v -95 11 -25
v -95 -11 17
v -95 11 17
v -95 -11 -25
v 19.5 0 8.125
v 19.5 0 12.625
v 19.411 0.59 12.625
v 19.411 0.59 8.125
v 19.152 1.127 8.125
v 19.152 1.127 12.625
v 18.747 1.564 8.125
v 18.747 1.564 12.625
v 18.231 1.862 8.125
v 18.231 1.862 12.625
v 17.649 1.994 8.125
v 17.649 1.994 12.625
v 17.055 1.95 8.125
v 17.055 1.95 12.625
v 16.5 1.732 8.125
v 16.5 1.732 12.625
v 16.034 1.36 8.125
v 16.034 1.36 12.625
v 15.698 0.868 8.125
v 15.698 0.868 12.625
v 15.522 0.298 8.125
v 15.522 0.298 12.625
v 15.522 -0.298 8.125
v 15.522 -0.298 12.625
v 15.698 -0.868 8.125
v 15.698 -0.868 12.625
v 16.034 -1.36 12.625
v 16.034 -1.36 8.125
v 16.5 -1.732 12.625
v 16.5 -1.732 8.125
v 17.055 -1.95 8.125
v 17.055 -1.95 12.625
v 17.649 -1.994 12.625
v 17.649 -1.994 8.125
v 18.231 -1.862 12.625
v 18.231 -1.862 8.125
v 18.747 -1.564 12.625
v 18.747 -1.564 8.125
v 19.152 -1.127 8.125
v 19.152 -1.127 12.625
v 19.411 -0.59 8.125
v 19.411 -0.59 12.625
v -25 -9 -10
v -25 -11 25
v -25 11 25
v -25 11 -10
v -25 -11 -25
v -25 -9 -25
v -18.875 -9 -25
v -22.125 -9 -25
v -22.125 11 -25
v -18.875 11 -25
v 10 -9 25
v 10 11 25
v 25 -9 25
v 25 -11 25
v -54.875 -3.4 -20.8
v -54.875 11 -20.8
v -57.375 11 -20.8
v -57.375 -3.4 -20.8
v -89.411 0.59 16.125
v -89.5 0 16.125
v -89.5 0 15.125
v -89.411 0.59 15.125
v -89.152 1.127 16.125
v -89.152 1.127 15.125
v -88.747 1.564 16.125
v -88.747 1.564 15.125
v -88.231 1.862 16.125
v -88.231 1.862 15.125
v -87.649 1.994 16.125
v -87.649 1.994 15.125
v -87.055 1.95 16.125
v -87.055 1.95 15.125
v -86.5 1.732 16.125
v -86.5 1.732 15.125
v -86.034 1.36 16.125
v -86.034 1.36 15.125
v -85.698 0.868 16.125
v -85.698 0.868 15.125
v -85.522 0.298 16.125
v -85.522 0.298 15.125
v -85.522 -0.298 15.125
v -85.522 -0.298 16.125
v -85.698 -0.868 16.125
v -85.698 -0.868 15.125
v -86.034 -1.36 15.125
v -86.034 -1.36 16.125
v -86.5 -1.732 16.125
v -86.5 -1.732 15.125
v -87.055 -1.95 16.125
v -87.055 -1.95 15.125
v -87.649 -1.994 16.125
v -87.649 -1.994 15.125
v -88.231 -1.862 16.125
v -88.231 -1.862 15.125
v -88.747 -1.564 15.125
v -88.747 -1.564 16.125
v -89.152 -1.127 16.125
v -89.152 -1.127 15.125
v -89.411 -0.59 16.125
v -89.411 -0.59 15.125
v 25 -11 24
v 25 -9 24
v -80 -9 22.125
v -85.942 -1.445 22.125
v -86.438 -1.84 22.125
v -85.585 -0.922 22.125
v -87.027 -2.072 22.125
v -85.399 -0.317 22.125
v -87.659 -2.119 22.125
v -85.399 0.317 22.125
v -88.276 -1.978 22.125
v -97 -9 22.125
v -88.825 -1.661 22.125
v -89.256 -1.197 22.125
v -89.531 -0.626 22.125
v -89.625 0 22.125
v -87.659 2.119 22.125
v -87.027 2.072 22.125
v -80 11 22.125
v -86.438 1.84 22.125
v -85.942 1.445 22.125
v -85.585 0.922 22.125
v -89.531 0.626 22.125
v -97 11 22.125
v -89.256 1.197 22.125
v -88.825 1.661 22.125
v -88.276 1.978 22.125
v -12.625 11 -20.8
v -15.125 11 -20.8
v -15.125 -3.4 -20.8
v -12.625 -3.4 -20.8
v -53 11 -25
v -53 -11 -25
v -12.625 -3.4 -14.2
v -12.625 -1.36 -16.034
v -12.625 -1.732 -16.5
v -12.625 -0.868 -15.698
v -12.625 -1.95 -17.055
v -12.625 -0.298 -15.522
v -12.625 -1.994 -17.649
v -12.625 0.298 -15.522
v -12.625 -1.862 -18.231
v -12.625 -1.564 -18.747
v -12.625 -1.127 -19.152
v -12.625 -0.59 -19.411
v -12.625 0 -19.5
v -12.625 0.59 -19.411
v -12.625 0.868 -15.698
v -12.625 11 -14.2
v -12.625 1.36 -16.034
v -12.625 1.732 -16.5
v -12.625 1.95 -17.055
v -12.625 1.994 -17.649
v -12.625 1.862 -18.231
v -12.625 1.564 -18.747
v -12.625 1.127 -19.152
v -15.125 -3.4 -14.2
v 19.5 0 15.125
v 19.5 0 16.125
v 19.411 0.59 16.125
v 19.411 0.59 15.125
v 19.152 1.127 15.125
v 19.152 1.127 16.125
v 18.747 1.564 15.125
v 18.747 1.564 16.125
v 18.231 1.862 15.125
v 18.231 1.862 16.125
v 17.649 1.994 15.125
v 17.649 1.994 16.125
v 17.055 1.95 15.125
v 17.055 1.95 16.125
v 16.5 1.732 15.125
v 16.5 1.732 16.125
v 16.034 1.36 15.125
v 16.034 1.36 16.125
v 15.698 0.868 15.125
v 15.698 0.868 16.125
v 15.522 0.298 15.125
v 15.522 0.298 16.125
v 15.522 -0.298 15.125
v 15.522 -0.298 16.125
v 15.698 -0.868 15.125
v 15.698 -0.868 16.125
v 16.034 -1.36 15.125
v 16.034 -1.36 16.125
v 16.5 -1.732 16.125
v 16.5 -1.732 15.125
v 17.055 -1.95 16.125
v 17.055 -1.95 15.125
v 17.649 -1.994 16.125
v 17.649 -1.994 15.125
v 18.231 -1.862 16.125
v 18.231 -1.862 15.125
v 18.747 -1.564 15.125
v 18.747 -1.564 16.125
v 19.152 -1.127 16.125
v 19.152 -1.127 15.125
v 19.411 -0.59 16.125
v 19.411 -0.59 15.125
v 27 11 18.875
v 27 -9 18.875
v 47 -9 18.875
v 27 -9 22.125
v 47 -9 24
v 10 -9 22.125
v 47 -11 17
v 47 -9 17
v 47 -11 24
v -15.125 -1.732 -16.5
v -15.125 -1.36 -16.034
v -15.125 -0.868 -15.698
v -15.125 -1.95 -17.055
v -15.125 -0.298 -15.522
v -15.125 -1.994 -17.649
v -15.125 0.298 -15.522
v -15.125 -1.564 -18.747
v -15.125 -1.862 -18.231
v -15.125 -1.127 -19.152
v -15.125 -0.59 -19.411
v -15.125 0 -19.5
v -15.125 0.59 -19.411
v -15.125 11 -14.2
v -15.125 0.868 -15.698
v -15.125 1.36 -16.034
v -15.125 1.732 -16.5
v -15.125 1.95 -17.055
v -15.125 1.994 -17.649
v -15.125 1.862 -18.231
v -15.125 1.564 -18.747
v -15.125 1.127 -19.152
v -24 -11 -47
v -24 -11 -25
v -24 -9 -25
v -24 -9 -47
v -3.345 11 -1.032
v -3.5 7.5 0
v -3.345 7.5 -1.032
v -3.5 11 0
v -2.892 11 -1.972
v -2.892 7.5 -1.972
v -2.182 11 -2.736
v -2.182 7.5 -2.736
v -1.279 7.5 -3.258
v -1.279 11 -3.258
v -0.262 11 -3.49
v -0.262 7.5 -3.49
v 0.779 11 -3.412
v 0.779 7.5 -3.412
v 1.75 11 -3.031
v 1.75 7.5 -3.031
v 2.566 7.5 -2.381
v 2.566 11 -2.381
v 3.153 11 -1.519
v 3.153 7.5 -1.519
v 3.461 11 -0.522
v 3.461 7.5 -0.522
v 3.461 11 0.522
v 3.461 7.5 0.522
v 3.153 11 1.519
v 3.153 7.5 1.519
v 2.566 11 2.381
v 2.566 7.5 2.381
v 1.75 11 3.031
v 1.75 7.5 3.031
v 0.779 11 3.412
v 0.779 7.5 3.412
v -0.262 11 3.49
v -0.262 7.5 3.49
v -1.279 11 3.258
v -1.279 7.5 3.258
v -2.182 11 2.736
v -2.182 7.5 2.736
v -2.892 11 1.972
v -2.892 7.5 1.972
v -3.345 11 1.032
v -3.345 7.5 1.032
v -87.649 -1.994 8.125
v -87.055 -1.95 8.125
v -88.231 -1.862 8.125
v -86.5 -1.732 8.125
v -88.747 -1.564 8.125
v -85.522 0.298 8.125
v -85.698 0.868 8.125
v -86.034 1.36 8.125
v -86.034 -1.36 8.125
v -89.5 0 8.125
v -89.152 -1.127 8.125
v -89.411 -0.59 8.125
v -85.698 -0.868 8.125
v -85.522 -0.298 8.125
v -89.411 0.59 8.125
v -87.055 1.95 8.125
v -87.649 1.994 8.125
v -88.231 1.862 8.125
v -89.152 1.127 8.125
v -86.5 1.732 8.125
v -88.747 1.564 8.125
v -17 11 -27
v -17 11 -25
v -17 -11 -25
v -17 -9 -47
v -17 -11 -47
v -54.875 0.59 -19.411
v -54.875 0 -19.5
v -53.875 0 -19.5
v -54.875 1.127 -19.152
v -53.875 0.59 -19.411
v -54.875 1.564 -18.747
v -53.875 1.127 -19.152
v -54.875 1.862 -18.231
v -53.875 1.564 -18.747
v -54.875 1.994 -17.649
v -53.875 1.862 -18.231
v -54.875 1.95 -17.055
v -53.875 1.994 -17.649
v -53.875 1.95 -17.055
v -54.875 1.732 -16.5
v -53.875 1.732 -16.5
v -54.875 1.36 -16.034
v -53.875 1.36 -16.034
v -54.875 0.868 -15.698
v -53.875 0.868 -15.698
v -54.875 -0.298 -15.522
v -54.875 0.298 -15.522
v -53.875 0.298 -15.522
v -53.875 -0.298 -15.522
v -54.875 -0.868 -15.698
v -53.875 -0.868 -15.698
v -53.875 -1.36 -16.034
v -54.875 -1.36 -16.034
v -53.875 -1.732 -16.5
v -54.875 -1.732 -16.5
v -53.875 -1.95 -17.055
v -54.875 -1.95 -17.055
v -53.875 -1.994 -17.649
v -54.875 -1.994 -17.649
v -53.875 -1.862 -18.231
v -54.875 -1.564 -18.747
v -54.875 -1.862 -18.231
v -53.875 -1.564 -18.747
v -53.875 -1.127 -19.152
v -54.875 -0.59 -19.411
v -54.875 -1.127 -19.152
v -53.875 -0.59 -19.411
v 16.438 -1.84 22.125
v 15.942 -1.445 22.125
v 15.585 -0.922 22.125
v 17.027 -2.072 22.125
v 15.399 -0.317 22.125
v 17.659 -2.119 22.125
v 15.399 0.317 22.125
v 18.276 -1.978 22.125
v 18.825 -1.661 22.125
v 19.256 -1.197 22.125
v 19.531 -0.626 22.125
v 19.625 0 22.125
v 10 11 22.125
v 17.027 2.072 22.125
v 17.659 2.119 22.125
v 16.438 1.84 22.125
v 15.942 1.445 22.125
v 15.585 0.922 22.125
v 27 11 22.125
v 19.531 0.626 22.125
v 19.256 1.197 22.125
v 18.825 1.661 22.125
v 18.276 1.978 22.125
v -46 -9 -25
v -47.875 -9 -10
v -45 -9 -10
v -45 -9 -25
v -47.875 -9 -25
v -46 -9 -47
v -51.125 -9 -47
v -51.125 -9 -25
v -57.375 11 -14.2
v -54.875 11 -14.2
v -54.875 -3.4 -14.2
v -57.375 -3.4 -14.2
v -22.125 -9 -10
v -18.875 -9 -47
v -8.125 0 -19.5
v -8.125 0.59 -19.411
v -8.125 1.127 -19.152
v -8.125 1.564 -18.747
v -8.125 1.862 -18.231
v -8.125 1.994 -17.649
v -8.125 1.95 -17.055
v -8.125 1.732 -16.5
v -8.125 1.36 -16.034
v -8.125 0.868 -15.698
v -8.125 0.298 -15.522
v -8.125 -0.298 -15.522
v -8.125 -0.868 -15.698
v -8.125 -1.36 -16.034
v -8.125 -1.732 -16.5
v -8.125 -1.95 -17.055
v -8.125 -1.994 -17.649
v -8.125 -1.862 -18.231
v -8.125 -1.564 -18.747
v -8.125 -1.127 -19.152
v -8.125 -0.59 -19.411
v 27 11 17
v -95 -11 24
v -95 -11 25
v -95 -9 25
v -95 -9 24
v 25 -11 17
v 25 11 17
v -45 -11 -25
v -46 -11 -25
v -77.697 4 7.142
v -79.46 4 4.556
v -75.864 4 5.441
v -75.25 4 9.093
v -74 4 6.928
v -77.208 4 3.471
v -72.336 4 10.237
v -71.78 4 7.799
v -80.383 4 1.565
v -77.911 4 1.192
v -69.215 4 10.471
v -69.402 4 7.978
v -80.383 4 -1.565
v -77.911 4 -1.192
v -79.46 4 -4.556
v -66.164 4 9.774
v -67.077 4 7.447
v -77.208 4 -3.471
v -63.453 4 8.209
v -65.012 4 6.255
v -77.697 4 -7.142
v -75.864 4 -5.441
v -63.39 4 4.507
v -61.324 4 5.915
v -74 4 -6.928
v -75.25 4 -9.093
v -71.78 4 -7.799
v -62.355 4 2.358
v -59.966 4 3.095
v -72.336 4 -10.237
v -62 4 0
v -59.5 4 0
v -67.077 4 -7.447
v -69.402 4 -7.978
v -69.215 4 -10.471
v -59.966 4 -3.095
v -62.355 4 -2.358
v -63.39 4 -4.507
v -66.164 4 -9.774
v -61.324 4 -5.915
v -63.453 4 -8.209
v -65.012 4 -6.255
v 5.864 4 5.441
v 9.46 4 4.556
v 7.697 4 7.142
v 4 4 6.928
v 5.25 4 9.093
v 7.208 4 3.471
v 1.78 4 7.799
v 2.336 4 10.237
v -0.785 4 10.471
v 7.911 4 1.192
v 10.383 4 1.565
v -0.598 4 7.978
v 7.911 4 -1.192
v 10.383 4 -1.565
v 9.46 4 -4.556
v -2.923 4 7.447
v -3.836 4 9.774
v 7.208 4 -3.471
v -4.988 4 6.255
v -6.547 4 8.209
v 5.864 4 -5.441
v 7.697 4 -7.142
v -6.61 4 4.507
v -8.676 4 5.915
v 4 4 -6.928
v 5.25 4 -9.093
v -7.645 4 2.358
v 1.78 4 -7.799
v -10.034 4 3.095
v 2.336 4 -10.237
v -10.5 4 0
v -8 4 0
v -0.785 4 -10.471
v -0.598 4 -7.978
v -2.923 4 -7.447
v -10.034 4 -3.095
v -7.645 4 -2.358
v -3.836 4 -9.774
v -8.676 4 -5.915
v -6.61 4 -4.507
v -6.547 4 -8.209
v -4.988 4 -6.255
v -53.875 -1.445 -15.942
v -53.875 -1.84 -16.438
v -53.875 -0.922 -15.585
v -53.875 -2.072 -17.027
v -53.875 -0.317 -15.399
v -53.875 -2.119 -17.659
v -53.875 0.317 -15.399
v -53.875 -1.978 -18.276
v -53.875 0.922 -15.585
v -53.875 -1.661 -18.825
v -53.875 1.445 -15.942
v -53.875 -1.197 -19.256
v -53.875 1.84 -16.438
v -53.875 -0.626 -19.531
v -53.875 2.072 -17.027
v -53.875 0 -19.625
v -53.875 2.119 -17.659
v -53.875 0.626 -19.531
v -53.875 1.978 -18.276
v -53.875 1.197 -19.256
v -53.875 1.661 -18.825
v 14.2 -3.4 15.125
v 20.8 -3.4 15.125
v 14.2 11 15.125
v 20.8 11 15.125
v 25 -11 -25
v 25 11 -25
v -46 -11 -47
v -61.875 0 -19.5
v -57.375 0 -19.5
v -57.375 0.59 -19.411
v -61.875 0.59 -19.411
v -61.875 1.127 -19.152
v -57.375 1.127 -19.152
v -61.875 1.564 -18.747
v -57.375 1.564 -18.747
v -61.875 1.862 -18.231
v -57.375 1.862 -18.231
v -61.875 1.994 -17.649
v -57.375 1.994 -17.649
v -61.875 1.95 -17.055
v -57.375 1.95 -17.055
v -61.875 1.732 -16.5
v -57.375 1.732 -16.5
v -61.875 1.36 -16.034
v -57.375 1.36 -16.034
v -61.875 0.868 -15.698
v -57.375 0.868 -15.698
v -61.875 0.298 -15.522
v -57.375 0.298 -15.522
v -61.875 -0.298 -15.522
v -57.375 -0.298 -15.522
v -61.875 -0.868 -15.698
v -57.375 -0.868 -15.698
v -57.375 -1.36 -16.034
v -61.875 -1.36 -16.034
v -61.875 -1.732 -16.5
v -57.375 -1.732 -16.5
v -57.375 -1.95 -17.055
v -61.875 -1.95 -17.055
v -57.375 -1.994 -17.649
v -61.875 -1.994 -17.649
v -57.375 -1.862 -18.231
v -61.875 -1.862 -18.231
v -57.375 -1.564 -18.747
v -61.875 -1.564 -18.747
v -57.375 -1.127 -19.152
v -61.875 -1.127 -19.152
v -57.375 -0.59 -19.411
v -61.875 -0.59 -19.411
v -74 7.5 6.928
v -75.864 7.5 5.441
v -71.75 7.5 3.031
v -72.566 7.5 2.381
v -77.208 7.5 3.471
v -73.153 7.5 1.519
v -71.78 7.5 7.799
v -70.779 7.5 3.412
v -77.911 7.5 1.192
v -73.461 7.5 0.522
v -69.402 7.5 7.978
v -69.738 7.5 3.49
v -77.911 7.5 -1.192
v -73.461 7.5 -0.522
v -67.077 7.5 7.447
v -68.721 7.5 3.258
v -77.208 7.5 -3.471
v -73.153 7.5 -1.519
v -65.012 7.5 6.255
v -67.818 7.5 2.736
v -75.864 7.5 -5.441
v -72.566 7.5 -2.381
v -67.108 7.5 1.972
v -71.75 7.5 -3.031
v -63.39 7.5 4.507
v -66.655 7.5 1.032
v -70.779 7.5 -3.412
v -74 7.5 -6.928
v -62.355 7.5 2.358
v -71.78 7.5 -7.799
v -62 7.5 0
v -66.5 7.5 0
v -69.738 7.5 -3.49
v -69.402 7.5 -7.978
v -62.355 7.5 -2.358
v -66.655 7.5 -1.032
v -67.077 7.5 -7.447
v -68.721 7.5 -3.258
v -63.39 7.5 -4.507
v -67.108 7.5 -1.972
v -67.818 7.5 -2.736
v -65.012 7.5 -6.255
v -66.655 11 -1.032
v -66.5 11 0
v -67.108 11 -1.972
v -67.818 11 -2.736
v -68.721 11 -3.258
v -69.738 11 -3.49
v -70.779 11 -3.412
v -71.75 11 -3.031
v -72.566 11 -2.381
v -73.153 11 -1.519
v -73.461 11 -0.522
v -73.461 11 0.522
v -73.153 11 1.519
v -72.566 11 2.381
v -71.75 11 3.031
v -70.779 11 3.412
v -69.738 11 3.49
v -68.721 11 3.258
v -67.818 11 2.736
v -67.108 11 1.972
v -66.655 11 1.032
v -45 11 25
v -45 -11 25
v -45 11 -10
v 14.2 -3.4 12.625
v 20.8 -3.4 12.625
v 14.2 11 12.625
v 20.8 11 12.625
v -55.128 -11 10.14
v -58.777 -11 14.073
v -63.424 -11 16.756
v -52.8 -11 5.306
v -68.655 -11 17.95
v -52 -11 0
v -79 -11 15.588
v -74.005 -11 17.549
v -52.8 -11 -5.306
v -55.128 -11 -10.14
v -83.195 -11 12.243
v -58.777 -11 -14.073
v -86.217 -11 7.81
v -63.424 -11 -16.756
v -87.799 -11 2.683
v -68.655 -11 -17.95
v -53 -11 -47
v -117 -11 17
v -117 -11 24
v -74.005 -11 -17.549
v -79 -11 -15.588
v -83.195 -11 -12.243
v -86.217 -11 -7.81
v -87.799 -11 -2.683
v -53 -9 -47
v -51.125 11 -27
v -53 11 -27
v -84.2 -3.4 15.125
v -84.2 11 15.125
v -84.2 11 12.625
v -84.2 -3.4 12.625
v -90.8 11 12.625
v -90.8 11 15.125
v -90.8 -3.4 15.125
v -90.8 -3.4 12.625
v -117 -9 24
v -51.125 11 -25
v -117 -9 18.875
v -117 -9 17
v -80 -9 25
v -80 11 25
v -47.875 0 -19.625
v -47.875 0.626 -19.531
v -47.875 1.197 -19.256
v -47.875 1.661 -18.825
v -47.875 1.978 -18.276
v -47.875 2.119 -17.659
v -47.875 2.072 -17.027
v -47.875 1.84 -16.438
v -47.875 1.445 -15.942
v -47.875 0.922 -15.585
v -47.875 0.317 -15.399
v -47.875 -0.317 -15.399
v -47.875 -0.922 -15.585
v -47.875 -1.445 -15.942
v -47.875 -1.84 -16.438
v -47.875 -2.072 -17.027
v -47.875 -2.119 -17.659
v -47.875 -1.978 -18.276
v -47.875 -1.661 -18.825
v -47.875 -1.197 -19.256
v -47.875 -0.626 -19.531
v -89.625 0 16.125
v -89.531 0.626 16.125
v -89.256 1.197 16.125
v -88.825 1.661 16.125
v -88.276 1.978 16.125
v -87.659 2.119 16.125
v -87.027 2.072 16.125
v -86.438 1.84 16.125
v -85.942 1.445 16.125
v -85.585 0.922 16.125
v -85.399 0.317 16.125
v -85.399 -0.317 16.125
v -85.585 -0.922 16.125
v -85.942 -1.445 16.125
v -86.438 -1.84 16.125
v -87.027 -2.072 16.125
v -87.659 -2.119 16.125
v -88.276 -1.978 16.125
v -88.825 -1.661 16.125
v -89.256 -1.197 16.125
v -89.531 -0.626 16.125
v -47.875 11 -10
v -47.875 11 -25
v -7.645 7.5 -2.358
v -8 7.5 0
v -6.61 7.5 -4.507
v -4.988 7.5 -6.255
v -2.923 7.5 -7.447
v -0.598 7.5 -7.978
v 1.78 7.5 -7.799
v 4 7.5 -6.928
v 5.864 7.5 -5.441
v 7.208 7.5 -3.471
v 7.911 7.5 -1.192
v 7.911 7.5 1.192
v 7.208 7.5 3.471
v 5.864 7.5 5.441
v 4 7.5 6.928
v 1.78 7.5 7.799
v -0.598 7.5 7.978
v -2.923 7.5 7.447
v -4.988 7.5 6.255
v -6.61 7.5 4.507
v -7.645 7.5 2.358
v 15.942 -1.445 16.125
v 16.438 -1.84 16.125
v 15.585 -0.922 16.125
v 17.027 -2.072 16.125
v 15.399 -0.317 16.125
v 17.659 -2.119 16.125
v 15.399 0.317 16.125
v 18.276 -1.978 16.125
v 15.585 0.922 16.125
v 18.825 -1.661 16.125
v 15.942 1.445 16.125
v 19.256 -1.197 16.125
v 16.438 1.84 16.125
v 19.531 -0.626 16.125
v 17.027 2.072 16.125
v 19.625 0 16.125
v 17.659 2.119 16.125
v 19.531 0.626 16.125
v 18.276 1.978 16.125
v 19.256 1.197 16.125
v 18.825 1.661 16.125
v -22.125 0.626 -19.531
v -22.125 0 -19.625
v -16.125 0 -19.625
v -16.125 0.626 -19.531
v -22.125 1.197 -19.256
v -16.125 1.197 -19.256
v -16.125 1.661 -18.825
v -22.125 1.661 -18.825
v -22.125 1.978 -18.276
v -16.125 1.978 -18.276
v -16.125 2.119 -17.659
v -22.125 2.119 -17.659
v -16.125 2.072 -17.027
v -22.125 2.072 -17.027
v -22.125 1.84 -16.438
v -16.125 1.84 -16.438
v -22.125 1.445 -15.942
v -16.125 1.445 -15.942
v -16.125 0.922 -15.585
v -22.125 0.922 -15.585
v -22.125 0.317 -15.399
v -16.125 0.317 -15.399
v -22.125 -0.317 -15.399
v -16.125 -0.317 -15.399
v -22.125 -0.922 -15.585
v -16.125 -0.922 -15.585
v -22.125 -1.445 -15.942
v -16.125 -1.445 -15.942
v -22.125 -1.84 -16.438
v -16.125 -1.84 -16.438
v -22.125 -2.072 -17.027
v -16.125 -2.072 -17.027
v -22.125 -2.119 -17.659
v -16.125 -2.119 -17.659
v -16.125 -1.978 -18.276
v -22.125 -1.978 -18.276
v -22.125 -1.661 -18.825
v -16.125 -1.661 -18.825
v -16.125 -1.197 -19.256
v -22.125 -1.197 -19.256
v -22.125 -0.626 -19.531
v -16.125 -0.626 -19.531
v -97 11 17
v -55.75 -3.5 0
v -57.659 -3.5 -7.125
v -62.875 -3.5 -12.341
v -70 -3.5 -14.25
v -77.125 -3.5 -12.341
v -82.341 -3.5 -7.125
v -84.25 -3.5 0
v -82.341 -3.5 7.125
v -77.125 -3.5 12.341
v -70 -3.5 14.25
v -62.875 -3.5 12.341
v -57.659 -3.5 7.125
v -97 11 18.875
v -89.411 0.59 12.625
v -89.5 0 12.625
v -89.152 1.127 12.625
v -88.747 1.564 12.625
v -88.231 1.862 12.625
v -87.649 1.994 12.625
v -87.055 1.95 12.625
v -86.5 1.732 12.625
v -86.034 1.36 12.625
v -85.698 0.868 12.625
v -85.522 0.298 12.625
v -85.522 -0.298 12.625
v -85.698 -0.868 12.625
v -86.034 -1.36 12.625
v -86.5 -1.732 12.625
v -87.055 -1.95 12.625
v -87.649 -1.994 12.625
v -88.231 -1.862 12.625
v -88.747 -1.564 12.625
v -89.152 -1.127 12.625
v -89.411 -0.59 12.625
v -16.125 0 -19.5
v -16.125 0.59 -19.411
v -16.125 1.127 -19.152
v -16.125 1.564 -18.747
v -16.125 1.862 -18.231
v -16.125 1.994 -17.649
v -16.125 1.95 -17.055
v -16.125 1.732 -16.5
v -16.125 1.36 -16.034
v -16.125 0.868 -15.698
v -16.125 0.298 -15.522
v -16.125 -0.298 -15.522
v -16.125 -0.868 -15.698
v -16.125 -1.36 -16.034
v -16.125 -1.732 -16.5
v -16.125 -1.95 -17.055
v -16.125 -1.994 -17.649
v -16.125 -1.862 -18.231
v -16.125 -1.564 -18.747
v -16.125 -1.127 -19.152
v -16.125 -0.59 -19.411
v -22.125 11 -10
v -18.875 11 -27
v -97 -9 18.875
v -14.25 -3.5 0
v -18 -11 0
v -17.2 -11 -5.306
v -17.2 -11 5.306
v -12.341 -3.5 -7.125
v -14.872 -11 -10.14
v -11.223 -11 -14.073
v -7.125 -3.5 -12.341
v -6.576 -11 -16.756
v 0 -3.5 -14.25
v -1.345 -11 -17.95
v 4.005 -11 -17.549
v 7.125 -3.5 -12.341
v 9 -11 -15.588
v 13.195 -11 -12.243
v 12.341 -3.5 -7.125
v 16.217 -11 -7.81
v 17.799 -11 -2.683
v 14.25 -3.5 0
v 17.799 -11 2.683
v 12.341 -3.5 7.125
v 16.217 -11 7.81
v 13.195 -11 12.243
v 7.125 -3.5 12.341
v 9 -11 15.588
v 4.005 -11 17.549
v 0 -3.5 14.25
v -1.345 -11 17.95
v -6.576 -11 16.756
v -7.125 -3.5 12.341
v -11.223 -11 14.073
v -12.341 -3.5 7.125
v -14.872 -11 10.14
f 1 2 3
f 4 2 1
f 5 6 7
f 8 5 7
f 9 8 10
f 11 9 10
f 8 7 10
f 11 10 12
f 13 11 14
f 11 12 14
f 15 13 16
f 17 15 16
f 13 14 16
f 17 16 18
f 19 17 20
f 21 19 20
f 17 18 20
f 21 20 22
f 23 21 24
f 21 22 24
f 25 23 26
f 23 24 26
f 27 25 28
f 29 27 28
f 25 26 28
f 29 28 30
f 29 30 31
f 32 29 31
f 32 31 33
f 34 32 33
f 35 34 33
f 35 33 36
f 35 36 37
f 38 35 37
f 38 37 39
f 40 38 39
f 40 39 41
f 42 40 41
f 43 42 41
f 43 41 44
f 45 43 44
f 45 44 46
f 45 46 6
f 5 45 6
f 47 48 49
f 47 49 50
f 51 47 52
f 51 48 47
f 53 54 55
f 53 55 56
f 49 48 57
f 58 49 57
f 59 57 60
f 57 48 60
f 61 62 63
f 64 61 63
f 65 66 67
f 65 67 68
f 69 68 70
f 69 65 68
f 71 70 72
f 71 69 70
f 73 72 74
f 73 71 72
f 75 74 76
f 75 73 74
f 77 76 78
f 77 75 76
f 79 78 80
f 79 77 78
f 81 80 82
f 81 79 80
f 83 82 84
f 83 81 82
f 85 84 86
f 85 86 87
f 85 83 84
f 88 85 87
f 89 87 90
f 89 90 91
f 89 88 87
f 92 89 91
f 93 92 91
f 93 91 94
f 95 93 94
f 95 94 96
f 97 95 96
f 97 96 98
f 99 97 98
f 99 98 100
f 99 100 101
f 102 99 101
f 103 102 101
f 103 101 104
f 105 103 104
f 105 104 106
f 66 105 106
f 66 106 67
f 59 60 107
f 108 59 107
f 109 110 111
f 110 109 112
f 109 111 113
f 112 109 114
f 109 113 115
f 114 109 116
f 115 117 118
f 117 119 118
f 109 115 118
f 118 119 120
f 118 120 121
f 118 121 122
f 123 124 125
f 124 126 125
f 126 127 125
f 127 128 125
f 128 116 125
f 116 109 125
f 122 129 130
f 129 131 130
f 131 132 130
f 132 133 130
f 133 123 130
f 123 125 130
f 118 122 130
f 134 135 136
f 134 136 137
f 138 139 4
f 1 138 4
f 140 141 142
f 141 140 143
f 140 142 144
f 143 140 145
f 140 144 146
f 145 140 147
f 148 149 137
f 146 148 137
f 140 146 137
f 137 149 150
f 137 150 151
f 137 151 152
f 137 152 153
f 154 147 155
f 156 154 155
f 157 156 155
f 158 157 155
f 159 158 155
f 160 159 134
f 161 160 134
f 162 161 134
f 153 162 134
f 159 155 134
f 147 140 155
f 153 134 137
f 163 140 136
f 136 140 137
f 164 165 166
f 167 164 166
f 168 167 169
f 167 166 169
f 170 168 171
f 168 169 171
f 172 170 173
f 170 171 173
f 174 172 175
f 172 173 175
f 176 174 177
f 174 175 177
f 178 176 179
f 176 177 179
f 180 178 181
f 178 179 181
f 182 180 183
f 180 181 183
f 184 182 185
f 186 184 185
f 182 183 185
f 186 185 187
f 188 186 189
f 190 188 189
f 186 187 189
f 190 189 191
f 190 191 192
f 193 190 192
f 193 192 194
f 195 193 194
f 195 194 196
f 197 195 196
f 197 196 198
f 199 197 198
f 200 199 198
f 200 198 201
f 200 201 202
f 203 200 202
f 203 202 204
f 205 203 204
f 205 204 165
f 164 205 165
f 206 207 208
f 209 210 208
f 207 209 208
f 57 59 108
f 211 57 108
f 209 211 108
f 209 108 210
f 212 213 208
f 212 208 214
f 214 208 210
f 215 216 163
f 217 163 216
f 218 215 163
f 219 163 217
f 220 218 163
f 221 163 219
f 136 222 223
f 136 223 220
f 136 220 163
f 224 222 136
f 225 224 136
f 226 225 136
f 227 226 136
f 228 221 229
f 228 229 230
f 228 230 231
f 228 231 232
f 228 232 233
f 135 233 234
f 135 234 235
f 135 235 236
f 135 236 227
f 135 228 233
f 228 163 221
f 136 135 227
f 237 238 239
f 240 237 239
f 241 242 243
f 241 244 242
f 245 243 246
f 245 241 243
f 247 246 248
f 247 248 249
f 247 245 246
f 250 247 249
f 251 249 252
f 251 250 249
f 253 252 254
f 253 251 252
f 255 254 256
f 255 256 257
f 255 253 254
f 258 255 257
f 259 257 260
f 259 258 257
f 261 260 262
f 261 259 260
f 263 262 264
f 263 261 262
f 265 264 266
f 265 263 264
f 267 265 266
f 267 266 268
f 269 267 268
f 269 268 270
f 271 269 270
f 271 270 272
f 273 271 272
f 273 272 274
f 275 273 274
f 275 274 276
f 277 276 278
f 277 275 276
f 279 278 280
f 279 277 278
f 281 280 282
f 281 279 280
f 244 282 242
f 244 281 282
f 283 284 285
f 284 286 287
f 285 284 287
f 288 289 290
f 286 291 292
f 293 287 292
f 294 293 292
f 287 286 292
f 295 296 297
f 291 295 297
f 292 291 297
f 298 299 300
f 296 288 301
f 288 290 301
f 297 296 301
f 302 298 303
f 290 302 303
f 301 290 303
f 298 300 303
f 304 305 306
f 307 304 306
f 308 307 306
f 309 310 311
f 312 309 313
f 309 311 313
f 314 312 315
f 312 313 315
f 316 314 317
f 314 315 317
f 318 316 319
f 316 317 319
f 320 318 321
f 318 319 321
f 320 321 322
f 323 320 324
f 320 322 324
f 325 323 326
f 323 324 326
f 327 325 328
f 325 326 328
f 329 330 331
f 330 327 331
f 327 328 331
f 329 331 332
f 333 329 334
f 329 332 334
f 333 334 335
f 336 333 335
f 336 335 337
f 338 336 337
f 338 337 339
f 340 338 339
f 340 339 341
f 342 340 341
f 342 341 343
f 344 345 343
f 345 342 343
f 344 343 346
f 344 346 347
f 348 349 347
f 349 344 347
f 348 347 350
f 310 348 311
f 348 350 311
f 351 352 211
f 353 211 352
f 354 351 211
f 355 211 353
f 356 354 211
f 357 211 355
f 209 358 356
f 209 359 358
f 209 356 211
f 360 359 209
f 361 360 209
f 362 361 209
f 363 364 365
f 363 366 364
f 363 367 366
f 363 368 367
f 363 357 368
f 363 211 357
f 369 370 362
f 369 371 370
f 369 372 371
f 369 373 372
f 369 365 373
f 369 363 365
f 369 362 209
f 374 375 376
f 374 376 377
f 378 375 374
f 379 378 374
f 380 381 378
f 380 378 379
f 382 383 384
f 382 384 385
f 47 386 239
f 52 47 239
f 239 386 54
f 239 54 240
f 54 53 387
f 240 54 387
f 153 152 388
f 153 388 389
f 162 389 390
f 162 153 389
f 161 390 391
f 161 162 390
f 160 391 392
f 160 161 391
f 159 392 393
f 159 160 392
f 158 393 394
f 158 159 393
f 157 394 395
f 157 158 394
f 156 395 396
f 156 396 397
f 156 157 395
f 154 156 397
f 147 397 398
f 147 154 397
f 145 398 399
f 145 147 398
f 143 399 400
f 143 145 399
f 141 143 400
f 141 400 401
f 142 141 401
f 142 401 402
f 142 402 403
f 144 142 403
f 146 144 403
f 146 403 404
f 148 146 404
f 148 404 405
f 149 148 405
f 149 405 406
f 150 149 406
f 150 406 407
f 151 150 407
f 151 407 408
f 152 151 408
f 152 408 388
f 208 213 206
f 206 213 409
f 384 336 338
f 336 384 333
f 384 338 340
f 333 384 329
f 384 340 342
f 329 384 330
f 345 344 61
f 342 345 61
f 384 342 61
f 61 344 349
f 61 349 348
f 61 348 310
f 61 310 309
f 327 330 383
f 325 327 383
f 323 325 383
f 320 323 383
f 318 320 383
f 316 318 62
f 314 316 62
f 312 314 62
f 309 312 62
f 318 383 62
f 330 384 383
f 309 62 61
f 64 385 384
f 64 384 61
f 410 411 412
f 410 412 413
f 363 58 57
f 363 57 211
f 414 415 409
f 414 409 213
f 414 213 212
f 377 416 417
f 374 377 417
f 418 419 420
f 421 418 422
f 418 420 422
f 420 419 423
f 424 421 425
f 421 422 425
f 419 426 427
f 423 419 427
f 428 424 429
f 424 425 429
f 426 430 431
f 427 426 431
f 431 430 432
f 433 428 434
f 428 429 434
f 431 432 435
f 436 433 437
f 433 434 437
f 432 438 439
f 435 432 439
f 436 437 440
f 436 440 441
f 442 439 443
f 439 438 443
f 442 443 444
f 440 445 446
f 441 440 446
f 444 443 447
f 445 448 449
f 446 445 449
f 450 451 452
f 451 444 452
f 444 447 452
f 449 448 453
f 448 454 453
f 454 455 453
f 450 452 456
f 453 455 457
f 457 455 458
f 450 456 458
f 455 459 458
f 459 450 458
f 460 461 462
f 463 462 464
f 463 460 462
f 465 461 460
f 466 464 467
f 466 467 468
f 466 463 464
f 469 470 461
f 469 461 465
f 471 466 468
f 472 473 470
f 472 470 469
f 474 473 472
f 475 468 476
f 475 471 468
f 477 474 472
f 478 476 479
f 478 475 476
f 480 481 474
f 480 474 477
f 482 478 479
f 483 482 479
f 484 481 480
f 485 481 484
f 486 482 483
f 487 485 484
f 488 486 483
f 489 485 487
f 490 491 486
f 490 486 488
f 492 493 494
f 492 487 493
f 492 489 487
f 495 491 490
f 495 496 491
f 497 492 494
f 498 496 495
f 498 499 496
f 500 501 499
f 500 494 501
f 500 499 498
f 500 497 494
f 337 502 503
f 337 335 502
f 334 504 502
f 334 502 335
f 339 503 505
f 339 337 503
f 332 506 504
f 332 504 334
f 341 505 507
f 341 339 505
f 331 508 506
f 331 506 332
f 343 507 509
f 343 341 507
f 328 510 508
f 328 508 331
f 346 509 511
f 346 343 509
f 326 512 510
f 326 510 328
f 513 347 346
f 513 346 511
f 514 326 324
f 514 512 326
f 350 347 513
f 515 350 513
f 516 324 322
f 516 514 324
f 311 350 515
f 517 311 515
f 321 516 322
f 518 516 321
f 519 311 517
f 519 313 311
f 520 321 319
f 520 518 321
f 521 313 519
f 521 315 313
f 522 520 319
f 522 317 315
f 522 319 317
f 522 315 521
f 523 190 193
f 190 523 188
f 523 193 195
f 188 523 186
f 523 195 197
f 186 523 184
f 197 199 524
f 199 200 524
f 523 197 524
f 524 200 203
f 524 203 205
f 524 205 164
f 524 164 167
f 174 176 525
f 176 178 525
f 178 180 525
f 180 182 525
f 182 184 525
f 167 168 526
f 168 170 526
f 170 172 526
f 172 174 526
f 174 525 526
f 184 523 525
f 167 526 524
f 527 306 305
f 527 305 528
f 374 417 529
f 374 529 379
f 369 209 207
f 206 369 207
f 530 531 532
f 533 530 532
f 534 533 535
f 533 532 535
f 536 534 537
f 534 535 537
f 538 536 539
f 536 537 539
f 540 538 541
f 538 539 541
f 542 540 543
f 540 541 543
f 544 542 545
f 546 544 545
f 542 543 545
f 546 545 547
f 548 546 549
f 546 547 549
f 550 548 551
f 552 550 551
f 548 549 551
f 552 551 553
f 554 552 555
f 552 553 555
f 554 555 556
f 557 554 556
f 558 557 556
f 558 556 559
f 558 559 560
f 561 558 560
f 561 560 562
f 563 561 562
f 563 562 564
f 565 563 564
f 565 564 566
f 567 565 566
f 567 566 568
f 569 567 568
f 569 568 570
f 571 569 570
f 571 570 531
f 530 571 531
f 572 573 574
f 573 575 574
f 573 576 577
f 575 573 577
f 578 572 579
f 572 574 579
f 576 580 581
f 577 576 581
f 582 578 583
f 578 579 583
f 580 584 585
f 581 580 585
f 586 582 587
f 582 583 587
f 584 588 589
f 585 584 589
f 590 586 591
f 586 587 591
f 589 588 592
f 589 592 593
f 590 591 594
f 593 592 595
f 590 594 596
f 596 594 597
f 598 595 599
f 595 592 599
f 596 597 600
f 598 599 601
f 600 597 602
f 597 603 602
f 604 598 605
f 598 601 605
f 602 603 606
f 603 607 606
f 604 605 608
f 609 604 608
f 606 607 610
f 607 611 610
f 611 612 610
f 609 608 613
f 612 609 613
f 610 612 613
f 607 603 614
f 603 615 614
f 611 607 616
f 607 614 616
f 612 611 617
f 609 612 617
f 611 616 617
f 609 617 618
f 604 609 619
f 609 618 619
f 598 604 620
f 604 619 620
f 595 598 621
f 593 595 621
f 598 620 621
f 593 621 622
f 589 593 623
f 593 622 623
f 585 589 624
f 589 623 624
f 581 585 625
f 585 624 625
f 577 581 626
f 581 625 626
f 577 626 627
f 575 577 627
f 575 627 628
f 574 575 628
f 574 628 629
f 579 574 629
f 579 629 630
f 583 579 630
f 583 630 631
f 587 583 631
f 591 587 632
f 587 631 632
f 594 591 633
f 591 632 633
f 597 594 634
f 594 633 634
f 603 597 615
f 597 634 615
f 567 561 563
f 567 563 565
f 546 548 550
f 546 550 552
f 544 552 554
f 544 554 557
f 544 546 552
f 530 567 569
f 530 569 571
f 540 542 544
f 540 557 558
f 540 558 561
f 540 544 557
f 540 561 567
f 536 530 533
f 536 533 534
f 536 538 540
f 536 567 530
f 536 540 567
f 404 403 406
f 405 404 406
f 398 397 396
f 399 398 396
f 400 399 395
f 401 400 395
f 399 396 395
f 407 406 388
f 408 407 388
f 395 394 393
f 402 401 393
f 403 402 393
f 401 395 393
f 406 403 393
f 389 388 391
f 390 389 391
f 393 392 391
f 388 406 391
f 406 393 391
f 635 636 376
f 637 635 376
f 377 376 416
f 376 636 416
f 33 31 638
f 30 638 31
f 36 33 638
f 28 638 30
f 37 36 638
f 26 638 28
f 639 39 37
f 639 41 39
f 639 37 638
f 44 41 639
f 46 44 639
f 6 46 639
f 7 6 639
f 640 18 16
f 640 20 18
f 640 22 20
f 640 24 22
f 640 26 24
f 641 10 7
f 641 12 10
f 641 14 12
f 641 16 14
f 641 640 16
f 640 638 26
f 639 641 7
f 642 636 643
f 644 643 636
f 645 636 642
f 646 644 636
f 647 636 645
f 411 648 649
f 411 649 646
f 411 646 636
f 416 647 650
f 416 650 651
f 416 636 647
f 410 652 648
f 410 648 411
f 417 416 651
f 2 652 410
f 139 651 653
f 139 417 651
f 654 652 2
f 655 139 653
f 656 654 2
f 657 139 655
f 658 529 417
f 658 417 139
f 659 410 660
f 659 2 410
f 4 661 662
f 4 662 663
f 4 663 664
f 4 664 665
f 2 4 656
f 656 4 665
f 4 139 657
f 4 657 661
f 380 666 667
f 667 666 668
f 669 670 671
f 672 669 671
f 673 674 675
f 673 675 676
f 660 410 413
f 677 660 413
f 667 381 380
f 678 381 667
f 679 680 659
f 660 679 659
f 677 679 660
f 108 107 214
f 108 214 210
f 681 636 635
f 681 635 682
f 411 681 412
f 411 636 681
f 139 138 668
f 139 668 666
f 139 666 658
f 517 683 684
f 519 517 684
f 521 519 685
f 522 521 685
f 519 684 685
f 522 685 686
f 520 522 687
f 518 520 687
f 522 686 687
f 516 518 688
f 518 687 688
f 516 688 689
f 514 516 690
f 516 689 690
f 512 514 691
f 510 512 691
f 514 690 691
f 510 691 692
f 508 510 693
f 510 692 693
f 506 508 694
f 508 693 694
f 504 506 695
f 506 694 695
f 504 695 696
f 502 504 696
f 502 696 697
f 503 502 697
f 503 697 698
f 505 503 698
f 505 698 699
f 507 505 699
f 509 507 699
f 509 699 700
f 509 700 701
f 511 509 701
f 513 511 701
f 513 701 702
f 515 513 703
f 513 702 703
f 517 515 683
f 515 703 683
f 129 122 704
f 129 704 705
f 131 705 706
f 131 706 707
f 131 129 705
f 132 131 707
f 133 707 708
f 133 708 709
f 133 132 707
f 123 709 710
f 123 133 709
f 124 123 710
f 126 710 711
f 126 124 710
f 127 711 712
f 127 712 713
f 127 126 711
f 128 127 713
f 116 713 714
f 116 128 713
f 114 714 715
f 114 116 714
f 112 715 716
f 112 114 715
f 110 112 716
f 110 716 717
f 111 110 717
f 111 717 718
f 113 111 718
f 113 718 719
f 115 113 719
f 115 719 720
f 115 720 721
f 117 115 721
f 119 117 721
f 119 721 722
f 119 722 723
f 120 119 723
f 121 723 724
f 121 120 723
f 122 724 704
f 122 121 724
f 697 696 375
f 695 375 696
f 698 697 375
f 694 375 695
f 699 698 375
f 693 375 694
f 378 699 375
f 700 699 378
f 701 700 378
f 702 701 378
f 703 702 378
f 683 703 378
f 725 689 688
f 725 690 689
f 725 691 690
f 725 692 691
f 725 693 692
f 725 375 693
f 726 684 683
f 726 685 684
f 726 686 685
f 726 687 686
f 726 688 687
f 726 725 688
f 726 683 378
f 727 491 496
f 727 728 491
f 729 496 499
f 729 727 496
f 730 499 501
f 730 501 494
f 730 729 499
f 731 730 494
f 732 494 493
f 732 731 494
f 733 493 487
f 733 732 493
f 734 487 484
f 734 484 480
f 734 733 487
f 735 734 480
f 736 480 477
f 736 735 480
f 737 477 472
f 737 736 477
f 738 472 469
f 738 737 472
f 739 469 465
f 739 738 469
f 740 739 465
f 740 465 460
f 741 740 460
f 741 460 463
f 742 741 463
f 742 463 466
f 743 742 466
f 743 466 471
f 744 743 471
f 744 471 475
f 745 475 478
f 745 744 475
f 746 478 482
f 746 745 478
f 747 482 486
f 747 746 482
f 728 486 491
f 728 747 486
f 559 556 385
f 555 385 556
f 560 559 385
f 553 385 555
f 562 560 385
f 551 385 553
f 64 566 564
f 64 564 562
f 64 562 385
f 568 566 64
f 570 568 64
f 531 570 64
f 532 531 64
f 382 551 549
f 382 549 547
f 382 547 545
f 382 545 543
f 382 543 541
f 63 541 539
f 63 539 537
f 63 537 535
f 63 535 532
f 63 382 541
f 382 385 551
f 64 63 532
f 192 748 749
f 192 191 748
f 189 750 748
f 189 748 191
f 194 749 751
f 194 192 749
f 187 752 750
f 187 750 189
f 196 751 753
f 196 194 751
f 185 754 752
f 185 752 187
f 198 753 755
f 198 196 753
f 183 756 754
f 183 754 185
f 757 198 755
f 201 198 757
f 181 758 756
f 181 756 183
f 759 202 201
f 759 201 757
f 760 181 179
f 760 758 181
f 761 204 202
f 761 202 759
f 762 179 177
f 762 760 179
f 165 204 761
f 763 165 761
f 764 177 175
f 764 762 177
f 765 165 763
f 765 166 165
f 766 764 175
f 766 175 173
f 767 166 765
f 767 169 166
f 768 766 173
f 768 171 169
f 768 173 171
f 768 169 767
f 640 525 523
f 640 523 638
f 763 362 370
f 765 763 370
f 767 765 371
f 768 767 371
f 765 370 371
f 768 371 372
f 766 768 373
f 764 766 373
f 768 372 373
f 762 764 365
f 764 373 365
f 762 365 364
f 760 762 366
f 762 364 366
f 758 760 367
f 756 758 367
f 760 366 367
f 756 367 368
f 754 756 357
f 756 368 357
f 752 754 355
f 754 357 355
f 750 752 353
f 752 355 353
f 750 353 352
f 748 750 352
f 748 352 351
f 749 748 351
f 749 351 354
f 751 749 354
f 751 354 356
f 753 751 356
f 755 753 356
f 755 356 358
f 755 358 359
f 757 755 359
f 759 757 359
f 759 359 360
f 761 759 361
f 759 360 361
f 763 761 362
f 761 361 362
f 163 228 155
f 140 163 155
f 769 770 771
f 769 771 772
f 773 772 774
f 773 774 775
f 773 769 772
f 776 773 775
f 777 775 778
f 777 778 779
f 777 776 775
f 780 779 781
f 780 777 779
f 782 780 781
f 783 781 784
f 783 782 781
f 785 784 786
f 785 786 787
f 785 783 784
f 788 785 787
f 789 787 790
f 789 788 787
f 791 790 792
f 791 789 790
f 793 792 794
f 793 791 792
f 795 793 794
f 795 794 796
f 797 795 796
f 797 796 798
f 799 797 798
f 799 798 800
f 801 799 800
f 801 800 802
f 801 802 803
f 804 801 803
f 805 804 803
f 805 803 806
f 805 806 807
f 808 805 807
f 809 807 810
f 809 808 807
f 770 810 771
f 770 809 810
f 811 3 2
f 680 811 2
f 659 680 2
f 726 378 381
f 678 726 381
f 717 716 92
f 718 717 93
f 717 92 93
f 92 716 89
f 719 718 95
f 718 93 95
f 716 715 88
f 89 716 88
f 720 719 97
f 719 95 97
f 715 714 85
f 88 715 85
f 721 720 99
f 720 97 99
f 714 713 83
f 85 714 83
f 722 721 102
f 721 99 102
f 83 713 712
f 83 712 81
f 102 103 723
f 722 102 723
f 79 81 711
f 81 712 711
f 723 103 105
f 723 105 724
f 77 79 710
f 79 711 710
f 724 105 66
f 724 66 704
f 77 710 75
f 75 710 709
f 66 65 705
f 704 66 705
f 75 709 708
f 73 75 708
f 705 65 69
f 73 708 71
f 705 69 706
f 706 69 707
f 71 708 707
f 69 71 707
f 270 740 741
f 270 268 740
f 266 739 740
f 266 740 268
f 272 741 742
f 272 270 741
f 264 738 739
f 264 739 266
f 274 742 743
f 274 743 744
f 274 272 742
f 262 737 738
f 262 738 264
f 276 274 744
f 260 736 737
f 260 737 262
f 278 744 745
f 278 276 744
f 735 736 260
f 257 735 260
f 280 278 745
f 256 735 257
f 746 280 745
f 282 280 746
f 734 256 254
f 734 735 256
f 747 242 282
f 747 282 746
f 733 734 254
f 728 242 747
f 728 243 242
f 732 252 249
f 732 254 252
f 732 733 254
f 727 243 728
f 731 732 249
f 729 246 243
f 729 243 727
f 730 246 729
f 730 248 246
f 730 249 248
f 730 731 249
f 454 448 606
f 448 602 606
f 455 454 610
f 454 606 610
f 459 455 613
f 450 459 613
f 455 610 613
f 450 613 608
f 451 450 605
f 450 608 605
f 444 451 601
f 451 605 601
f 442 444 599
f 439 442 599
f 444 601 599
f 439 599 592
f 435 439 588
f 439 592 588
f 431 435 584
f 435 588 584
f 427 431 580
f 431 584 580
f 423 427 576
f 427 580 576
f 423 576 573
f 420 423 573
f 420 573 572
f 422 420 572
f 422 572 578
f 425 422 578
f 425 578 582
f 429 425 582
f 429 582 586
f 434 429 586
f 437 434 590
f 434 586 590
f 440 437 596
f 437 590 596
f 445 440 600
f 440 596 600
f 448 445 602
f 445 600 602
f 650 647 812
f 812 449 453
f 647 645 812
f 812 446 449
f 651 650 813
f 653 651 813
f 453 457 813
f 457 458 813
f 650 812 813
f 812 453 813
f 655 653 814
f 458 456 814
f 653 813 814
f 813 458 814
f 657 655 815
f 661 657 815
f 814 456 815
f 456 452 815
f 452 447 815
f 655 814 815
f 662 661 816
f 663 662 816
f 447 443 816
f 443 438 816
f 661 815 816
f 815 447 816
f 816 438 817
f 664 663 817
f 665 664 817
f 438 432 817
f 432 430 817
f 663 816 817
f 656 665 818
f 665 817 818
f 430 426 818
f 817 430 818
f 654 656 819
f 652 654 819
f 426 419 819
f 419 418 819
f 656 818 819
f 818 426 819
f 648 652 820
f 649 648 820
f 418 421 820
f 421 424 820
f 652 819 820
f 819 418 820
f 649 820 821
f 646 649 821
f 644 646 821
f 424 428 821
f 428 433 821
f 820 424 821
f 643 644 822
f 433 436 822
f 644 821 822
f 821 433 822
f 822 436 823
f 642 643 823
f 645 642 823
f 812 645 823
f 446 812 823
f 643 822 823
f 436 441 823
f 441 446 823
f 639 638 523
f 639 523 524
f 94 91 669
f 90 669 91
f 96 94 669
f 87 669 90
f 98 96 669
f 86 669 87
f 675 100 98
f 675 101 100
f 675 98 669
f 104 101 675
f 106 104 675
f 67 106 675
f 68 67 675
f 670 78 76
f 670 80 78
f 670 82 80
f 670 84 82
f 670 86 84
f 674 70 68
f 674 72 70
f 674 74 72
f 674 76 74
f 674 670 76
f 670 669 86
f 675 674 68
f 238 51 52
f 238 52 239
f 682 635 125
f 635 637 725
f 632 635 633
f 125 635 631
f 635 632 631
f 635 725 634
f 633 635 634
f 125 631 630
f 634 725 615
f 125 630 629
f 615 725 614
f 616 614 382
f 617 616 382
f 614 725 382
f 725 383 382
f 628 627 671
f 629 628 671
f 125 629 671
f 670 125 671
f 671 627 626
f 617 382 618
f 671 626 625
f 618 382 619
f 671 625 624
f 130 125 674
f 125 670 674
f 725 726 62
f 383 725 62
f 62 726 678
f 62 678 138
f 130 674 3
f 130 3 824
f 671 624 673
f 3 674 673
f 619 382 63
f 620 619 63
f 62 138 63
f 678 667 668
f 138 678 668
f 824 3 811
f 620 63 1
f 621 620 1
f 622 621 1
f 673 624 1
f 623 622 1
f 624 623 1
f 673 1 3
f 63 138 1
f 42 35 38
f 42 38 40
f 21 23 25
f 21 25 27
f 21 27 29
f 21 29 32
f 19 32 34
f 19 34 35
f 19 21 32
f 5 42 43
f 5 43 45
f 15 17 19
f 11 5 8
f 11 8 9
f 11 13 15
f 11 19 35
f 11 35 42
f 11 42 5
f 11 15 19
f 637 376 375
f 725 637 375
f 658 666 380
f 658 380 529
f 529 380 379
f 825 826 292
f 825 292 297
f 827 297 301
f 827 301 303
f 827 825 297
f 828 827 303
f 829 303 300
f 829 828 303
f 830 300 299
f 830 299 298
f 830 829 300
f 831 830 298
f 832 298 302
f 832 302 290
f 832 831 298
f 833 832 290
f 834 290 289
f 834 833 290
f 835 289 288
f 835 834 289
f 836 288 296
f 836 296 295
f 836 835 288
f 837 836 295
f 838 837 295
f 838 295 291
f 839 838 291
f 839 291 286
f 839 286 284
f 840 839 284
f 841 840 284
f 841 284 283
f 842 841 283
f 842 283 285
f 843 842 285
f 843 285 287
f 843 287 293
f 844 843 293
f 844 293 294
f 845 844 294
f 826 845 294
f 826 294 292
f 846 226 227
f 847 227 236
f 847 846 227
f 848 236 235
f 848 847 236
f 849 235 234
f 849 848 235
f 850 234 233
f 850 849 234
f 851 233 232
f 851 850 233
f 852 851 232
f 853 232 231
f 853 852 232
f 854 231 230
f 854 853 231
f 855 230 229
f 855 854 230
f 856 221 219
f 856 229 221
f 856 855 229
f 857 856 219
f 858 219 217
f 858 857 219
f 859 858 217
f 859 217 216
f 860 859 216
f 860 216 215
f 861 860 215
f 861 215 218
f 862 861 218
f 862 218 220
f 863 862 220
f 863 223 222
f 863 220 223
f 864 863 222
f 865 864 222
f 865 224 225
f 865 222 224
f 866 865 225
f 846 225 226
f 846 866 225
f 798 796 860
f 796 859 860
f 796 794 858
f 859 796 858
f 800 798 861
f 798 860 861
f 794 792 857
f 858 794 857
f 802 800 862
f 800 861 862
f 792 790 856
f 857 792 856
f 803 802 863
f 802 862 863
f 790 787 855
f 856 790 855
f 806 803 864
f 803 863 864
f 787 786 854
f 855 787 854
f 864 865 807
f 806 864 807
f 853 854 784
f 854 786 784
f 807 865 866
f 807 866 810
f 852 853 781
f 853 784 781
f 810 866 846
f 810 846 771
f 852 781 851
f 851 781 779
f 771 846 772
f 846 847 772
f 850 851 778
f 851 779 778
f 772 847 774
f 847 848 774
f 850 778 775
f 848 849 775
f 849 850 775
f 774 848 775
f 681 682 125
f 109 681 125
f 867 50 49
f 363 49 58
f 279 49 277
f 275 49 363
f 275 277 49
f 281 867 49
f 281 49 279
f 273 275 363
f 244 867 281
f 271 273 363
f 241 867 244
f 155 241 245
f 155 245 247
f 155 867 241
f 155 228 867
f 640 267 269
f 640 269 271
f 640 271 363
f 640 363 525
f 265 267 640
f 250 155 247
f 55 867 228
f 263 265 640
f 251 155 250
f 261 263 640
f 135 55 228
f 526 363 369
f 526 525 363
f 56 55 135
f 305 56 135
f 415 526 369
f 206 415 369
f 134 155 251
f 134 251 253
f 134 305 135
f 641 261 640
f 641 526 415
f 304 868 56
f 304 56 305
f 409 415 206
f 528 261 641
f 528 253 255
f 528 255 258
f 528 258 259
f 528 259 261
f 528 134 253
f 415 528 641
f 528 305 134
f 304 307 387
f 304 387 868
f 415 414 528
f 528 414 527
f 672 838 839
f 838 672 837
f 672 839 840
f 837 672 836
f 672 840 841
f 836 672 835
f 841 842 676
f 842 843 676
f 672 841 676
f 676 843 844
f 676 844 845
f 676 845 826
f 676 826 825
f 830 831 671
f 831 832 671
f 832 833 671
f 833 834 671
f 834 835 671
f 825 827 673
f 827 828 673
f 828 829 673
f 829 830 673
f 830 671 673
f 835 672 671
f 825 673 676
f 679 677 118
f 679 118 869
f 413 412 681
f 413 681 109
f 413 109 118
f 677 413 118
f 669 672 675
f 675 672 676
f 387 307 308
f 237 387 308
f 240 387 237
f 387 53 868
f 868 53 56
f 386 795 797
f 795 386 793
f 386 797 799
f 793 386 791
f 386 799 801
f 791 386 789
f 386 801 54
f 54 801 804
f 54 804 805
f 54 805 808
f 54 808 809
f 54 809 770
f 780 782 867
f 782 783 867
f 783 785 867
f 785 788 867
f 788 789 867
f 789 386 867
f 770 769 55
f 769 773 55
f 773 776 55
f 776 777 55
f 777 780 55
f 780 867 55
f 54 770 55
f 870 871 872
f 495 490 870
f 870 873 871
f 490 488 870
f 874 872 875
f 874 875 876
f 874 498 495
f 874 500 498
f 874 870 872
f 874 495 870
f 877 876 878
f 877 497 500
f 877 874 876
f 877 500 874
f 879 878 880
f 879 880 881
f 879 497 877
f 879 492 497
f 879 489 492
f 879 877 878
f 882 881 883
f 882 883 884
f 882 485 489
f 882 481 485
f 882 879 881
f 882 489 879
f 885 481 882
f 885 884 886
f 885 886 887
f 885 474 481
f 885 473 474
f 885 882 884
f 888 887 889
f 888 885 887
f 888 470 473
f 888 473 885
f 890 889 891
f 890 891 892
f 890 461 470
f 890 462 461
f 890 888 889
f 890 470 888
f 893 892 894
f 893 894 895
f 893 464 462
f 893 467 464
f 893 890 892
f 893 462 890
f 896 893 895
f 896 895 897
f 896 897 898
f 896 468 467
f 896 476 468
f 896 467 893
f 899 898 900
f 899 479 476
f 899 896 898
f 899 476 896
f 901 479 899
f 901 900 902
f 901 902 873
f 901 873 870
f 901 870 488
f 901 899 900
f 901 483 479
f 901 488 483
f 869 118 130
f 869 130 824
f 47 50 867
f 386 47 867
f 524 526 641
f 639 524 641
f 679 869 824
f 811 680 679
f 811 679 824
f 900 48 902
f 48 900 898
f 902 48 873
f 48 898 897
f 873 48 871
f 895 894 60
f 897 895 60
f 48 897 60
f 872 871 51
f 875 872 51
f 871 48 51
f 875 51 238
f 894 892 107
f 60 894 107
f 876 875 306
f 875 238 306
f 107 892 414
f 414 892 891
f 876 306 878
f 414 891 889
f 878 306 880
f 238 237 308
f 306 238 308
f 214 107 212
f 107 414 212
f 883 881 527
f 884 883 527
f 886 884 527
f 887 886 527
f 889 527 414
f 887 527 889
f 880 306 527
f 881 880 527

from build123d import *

# Parameters (mm, degrees)
BOSS_EXTRUDE1_DEPTH      = 11
BOSS_EXTRUDE1_DEPTH_BACK = 11
SKETCH1_W                = 50
SKETCH1_H                = 50
BOSS_EXTRUDE2_DEPTH      = 22
CUT_EXTRUDE1_DEPTH       = 7
SKETCH5_W                = 2
SKETCH5_H                = 3.25
BOSS_EXTRUDE3_DEPTH      = 20
SKETCH6_W                = 37
SKETCH6_H                = 2.875
CUT_EXTRUDE2_DEPTH       = 20
SKETCH8_R                = 2.125
CUT_EXTRUDE3_DEPTH       = 6
SKETCH9_W                = 6.6
SKETCH9_H                = 2.5
CUT_EXTRUDE4_DEPTH       = 14.4
SKETCH11_R               = 2
CUT_EXTRUDE5_DEPTH       = 8


with BuildPart() as part:
    # Sketch1 → Boss-Extrude1 (new, two sides: drawn at the far end of the back side and taken through both)
    with BuildSketch(Plane(origin=(0, 0, 0), x_dir=(1, 0, 0), z_dir=(0, 1, 0)).offset(-BOSS_EXTRUDE1_DEPTH_BACK)):
        Rectangle(SKETCH1_W, SKETCH1_H)
    extrude(amount=BOSS_EXTRUDE1_DEPTH + BOSS_EXTRUDE1_DEPTH_BACK)

    # Sketch2 → Cut-Revolve1 (revolve, cut)
    with BuildSketch(Plane.XY):
        Polygon((-3.5, 7.5), (-3.5, 11), (0, 11), (0, -11), (-18, -11), (-10.5, 4), (-8, 4), (-8, 7.5), align=None)
    revolve(axis=Axis((0, 11, 0), (0, -1, 0)), mode=Mode.SUBTRACT)

    # Sketch3 → Boss-Extrude2 (add)
    with BuildSketch(Plane(origin=(25, 0, 0), x_dir=(0, 0, -1), z_dir=(1, 0, 0))):
        Polygon((-24, 11), (-22.125, 11), (-22.125, -9), (-18.875, -9), (-18.875, 11), (-17, 11), (-17, -11), (-24, -11), align=None)
    boss_extrude2 = extrude(amount=BOSS_EXTRUDE2_DEPTH)

    # Sketch4 → Cut-Extrude1 (cut)
    with BuildSketch(Plane(origin=(0, 0, 17), x_dir=(-1, 0, 0), z_dir=(0, 0, -1))):
        Polygon((-47, -9), (-27, 11), (-47, 11), align=None)
    cut_extrude1 = extrude(amount=-CUT_EXTRUDE1_DEPTH, mode=Mode.SUBTRACT)

    # Sketch5 → Boss-Extrude3 (add)
    with BuildSketch(Plane(origin=(0, -9, 0), x_dir=(1, 0, 0), z_dir=(0, 1, 0))):
        with Locations((26, -20.5)):
            Rectangle(SKETCH5_W, SKETCH5_H)
    extrude(amount=BOSS_EXTRUDE3_DEPTH)

    # Sketch6 → Cut-Extrude2 (cut)
    with BuildSketch(Plane(origin=(0, 11, 0), x_dir=(1, 0, 0), z_dir=(0, 1, 0))):
        with Locations((28.5, -23.5625)):
            Rectangle(SKETCH6_W, SKETCH6_H)
    cut_extrude2 = extrude(amount=-CUT_EXTRUDE2_DEPTH, mode=Mode.SUBTRACT)

    # Sketch8 → Cut-Extrude3 (cut)
    with BuildSketch(Plane.XY.offset(22.125)):
        with Locations((17.5, 0)):
            Circle(SKETCH8_R)
    cut_extrude3 = extrude(amount=-CUT_EXTRUDE3_DEPTH, mode=Mode.SUBTRACT)

    # Sketch9 → Cut-Extrude4 (cut)
    with BuildSketch(Plane(origin=(0, 11, 0), x_dir=(1, 0, 0), z_dir=(0, 1, 0))):
        with Locations((17.5, -13.875)):
            Rectangle(SKETCH9_W, SKETCH9_H)
    cut_extrude4 = extrude(amount=-CUT_EXTRUDE4_DEPTH, mode=Mode.SUBTRACT)

    # Sketch11 → Cut-Extrude5 (cut)
    with BuildSketch(Plane.XY.offset(16.125)):
        with Locations((17.5, 0)):
            Circle(SKETCH11_R)
    cut_extrude5 = extrude(amount=-CUT_EXTRUDE5_DEPTH, mode=Mode.SUBTRACT)

    # Mirror1: Boss-Extrude2, Cut-Extrude1, Cut-Extrude2, Cut-Extrude3, Cut-Extrude4, Cut-Extrude5 across plane
    add(boss_extrude2.mirror(Plane(origin=(0, 0, 0), x_dir=(-0.7071067811865476, 0, 0.7071067811865476), z_dir=(0.7071067811865477, 0, 0.7071067811865475))))
    add(cut_extrude1.mirror(Plane(origin=(0, 0, 0), x_dir=(-0.7071067811865476, 0, 0.7071067811865476), z_dir=(0.7071067811865477, 0, 0.7071067811865475))), mode=Mode.SUBTRACT)
    add(cut_extrude2.mirror(Plane(origin=(0, 0, 0), x_dir=(-0.7071067811865476, 0, 0.7071067811865476), z_dir=(0.7071067811865477, 0, 0.7071067811865475))), mode=Mode.SUBTRACT)
    add(cut_extrude3.mirror(Plane(origin=(0, 0, 0), x_dir=(-0.7071067811865476, 0, 0.7071067811865476), z_dir=(0.7071067811865477, 0, 0.7071067811865475))), mode=Mode.SUBTRACT)
    add(cut_extrude4.mirror(Plane(origin=(0, 0, 0), x_dir=(-0.7071067811865476, 0, 0.7071067811865476), z_dir=(0.7071067811865477, 0, 0.7071067811865475))), mode=Mode.SUBTRACT)
    add(cut_extrude5.mirror(Plane(origin=(0, 0, 0), x_dir=(-0.7071067811865476, 0, 0.7071067811865476), z_dir=(0.7071067811865477, 0, 0.7071067811865475))), mode=Mode.SUBTRACT)


with BuildPart() as body_2:
    # Mirror2: mirrored copy
    add(part.part.mirror(Plane.ZY.offset(35)))


solid = Compound([part.part, body_2.part])
